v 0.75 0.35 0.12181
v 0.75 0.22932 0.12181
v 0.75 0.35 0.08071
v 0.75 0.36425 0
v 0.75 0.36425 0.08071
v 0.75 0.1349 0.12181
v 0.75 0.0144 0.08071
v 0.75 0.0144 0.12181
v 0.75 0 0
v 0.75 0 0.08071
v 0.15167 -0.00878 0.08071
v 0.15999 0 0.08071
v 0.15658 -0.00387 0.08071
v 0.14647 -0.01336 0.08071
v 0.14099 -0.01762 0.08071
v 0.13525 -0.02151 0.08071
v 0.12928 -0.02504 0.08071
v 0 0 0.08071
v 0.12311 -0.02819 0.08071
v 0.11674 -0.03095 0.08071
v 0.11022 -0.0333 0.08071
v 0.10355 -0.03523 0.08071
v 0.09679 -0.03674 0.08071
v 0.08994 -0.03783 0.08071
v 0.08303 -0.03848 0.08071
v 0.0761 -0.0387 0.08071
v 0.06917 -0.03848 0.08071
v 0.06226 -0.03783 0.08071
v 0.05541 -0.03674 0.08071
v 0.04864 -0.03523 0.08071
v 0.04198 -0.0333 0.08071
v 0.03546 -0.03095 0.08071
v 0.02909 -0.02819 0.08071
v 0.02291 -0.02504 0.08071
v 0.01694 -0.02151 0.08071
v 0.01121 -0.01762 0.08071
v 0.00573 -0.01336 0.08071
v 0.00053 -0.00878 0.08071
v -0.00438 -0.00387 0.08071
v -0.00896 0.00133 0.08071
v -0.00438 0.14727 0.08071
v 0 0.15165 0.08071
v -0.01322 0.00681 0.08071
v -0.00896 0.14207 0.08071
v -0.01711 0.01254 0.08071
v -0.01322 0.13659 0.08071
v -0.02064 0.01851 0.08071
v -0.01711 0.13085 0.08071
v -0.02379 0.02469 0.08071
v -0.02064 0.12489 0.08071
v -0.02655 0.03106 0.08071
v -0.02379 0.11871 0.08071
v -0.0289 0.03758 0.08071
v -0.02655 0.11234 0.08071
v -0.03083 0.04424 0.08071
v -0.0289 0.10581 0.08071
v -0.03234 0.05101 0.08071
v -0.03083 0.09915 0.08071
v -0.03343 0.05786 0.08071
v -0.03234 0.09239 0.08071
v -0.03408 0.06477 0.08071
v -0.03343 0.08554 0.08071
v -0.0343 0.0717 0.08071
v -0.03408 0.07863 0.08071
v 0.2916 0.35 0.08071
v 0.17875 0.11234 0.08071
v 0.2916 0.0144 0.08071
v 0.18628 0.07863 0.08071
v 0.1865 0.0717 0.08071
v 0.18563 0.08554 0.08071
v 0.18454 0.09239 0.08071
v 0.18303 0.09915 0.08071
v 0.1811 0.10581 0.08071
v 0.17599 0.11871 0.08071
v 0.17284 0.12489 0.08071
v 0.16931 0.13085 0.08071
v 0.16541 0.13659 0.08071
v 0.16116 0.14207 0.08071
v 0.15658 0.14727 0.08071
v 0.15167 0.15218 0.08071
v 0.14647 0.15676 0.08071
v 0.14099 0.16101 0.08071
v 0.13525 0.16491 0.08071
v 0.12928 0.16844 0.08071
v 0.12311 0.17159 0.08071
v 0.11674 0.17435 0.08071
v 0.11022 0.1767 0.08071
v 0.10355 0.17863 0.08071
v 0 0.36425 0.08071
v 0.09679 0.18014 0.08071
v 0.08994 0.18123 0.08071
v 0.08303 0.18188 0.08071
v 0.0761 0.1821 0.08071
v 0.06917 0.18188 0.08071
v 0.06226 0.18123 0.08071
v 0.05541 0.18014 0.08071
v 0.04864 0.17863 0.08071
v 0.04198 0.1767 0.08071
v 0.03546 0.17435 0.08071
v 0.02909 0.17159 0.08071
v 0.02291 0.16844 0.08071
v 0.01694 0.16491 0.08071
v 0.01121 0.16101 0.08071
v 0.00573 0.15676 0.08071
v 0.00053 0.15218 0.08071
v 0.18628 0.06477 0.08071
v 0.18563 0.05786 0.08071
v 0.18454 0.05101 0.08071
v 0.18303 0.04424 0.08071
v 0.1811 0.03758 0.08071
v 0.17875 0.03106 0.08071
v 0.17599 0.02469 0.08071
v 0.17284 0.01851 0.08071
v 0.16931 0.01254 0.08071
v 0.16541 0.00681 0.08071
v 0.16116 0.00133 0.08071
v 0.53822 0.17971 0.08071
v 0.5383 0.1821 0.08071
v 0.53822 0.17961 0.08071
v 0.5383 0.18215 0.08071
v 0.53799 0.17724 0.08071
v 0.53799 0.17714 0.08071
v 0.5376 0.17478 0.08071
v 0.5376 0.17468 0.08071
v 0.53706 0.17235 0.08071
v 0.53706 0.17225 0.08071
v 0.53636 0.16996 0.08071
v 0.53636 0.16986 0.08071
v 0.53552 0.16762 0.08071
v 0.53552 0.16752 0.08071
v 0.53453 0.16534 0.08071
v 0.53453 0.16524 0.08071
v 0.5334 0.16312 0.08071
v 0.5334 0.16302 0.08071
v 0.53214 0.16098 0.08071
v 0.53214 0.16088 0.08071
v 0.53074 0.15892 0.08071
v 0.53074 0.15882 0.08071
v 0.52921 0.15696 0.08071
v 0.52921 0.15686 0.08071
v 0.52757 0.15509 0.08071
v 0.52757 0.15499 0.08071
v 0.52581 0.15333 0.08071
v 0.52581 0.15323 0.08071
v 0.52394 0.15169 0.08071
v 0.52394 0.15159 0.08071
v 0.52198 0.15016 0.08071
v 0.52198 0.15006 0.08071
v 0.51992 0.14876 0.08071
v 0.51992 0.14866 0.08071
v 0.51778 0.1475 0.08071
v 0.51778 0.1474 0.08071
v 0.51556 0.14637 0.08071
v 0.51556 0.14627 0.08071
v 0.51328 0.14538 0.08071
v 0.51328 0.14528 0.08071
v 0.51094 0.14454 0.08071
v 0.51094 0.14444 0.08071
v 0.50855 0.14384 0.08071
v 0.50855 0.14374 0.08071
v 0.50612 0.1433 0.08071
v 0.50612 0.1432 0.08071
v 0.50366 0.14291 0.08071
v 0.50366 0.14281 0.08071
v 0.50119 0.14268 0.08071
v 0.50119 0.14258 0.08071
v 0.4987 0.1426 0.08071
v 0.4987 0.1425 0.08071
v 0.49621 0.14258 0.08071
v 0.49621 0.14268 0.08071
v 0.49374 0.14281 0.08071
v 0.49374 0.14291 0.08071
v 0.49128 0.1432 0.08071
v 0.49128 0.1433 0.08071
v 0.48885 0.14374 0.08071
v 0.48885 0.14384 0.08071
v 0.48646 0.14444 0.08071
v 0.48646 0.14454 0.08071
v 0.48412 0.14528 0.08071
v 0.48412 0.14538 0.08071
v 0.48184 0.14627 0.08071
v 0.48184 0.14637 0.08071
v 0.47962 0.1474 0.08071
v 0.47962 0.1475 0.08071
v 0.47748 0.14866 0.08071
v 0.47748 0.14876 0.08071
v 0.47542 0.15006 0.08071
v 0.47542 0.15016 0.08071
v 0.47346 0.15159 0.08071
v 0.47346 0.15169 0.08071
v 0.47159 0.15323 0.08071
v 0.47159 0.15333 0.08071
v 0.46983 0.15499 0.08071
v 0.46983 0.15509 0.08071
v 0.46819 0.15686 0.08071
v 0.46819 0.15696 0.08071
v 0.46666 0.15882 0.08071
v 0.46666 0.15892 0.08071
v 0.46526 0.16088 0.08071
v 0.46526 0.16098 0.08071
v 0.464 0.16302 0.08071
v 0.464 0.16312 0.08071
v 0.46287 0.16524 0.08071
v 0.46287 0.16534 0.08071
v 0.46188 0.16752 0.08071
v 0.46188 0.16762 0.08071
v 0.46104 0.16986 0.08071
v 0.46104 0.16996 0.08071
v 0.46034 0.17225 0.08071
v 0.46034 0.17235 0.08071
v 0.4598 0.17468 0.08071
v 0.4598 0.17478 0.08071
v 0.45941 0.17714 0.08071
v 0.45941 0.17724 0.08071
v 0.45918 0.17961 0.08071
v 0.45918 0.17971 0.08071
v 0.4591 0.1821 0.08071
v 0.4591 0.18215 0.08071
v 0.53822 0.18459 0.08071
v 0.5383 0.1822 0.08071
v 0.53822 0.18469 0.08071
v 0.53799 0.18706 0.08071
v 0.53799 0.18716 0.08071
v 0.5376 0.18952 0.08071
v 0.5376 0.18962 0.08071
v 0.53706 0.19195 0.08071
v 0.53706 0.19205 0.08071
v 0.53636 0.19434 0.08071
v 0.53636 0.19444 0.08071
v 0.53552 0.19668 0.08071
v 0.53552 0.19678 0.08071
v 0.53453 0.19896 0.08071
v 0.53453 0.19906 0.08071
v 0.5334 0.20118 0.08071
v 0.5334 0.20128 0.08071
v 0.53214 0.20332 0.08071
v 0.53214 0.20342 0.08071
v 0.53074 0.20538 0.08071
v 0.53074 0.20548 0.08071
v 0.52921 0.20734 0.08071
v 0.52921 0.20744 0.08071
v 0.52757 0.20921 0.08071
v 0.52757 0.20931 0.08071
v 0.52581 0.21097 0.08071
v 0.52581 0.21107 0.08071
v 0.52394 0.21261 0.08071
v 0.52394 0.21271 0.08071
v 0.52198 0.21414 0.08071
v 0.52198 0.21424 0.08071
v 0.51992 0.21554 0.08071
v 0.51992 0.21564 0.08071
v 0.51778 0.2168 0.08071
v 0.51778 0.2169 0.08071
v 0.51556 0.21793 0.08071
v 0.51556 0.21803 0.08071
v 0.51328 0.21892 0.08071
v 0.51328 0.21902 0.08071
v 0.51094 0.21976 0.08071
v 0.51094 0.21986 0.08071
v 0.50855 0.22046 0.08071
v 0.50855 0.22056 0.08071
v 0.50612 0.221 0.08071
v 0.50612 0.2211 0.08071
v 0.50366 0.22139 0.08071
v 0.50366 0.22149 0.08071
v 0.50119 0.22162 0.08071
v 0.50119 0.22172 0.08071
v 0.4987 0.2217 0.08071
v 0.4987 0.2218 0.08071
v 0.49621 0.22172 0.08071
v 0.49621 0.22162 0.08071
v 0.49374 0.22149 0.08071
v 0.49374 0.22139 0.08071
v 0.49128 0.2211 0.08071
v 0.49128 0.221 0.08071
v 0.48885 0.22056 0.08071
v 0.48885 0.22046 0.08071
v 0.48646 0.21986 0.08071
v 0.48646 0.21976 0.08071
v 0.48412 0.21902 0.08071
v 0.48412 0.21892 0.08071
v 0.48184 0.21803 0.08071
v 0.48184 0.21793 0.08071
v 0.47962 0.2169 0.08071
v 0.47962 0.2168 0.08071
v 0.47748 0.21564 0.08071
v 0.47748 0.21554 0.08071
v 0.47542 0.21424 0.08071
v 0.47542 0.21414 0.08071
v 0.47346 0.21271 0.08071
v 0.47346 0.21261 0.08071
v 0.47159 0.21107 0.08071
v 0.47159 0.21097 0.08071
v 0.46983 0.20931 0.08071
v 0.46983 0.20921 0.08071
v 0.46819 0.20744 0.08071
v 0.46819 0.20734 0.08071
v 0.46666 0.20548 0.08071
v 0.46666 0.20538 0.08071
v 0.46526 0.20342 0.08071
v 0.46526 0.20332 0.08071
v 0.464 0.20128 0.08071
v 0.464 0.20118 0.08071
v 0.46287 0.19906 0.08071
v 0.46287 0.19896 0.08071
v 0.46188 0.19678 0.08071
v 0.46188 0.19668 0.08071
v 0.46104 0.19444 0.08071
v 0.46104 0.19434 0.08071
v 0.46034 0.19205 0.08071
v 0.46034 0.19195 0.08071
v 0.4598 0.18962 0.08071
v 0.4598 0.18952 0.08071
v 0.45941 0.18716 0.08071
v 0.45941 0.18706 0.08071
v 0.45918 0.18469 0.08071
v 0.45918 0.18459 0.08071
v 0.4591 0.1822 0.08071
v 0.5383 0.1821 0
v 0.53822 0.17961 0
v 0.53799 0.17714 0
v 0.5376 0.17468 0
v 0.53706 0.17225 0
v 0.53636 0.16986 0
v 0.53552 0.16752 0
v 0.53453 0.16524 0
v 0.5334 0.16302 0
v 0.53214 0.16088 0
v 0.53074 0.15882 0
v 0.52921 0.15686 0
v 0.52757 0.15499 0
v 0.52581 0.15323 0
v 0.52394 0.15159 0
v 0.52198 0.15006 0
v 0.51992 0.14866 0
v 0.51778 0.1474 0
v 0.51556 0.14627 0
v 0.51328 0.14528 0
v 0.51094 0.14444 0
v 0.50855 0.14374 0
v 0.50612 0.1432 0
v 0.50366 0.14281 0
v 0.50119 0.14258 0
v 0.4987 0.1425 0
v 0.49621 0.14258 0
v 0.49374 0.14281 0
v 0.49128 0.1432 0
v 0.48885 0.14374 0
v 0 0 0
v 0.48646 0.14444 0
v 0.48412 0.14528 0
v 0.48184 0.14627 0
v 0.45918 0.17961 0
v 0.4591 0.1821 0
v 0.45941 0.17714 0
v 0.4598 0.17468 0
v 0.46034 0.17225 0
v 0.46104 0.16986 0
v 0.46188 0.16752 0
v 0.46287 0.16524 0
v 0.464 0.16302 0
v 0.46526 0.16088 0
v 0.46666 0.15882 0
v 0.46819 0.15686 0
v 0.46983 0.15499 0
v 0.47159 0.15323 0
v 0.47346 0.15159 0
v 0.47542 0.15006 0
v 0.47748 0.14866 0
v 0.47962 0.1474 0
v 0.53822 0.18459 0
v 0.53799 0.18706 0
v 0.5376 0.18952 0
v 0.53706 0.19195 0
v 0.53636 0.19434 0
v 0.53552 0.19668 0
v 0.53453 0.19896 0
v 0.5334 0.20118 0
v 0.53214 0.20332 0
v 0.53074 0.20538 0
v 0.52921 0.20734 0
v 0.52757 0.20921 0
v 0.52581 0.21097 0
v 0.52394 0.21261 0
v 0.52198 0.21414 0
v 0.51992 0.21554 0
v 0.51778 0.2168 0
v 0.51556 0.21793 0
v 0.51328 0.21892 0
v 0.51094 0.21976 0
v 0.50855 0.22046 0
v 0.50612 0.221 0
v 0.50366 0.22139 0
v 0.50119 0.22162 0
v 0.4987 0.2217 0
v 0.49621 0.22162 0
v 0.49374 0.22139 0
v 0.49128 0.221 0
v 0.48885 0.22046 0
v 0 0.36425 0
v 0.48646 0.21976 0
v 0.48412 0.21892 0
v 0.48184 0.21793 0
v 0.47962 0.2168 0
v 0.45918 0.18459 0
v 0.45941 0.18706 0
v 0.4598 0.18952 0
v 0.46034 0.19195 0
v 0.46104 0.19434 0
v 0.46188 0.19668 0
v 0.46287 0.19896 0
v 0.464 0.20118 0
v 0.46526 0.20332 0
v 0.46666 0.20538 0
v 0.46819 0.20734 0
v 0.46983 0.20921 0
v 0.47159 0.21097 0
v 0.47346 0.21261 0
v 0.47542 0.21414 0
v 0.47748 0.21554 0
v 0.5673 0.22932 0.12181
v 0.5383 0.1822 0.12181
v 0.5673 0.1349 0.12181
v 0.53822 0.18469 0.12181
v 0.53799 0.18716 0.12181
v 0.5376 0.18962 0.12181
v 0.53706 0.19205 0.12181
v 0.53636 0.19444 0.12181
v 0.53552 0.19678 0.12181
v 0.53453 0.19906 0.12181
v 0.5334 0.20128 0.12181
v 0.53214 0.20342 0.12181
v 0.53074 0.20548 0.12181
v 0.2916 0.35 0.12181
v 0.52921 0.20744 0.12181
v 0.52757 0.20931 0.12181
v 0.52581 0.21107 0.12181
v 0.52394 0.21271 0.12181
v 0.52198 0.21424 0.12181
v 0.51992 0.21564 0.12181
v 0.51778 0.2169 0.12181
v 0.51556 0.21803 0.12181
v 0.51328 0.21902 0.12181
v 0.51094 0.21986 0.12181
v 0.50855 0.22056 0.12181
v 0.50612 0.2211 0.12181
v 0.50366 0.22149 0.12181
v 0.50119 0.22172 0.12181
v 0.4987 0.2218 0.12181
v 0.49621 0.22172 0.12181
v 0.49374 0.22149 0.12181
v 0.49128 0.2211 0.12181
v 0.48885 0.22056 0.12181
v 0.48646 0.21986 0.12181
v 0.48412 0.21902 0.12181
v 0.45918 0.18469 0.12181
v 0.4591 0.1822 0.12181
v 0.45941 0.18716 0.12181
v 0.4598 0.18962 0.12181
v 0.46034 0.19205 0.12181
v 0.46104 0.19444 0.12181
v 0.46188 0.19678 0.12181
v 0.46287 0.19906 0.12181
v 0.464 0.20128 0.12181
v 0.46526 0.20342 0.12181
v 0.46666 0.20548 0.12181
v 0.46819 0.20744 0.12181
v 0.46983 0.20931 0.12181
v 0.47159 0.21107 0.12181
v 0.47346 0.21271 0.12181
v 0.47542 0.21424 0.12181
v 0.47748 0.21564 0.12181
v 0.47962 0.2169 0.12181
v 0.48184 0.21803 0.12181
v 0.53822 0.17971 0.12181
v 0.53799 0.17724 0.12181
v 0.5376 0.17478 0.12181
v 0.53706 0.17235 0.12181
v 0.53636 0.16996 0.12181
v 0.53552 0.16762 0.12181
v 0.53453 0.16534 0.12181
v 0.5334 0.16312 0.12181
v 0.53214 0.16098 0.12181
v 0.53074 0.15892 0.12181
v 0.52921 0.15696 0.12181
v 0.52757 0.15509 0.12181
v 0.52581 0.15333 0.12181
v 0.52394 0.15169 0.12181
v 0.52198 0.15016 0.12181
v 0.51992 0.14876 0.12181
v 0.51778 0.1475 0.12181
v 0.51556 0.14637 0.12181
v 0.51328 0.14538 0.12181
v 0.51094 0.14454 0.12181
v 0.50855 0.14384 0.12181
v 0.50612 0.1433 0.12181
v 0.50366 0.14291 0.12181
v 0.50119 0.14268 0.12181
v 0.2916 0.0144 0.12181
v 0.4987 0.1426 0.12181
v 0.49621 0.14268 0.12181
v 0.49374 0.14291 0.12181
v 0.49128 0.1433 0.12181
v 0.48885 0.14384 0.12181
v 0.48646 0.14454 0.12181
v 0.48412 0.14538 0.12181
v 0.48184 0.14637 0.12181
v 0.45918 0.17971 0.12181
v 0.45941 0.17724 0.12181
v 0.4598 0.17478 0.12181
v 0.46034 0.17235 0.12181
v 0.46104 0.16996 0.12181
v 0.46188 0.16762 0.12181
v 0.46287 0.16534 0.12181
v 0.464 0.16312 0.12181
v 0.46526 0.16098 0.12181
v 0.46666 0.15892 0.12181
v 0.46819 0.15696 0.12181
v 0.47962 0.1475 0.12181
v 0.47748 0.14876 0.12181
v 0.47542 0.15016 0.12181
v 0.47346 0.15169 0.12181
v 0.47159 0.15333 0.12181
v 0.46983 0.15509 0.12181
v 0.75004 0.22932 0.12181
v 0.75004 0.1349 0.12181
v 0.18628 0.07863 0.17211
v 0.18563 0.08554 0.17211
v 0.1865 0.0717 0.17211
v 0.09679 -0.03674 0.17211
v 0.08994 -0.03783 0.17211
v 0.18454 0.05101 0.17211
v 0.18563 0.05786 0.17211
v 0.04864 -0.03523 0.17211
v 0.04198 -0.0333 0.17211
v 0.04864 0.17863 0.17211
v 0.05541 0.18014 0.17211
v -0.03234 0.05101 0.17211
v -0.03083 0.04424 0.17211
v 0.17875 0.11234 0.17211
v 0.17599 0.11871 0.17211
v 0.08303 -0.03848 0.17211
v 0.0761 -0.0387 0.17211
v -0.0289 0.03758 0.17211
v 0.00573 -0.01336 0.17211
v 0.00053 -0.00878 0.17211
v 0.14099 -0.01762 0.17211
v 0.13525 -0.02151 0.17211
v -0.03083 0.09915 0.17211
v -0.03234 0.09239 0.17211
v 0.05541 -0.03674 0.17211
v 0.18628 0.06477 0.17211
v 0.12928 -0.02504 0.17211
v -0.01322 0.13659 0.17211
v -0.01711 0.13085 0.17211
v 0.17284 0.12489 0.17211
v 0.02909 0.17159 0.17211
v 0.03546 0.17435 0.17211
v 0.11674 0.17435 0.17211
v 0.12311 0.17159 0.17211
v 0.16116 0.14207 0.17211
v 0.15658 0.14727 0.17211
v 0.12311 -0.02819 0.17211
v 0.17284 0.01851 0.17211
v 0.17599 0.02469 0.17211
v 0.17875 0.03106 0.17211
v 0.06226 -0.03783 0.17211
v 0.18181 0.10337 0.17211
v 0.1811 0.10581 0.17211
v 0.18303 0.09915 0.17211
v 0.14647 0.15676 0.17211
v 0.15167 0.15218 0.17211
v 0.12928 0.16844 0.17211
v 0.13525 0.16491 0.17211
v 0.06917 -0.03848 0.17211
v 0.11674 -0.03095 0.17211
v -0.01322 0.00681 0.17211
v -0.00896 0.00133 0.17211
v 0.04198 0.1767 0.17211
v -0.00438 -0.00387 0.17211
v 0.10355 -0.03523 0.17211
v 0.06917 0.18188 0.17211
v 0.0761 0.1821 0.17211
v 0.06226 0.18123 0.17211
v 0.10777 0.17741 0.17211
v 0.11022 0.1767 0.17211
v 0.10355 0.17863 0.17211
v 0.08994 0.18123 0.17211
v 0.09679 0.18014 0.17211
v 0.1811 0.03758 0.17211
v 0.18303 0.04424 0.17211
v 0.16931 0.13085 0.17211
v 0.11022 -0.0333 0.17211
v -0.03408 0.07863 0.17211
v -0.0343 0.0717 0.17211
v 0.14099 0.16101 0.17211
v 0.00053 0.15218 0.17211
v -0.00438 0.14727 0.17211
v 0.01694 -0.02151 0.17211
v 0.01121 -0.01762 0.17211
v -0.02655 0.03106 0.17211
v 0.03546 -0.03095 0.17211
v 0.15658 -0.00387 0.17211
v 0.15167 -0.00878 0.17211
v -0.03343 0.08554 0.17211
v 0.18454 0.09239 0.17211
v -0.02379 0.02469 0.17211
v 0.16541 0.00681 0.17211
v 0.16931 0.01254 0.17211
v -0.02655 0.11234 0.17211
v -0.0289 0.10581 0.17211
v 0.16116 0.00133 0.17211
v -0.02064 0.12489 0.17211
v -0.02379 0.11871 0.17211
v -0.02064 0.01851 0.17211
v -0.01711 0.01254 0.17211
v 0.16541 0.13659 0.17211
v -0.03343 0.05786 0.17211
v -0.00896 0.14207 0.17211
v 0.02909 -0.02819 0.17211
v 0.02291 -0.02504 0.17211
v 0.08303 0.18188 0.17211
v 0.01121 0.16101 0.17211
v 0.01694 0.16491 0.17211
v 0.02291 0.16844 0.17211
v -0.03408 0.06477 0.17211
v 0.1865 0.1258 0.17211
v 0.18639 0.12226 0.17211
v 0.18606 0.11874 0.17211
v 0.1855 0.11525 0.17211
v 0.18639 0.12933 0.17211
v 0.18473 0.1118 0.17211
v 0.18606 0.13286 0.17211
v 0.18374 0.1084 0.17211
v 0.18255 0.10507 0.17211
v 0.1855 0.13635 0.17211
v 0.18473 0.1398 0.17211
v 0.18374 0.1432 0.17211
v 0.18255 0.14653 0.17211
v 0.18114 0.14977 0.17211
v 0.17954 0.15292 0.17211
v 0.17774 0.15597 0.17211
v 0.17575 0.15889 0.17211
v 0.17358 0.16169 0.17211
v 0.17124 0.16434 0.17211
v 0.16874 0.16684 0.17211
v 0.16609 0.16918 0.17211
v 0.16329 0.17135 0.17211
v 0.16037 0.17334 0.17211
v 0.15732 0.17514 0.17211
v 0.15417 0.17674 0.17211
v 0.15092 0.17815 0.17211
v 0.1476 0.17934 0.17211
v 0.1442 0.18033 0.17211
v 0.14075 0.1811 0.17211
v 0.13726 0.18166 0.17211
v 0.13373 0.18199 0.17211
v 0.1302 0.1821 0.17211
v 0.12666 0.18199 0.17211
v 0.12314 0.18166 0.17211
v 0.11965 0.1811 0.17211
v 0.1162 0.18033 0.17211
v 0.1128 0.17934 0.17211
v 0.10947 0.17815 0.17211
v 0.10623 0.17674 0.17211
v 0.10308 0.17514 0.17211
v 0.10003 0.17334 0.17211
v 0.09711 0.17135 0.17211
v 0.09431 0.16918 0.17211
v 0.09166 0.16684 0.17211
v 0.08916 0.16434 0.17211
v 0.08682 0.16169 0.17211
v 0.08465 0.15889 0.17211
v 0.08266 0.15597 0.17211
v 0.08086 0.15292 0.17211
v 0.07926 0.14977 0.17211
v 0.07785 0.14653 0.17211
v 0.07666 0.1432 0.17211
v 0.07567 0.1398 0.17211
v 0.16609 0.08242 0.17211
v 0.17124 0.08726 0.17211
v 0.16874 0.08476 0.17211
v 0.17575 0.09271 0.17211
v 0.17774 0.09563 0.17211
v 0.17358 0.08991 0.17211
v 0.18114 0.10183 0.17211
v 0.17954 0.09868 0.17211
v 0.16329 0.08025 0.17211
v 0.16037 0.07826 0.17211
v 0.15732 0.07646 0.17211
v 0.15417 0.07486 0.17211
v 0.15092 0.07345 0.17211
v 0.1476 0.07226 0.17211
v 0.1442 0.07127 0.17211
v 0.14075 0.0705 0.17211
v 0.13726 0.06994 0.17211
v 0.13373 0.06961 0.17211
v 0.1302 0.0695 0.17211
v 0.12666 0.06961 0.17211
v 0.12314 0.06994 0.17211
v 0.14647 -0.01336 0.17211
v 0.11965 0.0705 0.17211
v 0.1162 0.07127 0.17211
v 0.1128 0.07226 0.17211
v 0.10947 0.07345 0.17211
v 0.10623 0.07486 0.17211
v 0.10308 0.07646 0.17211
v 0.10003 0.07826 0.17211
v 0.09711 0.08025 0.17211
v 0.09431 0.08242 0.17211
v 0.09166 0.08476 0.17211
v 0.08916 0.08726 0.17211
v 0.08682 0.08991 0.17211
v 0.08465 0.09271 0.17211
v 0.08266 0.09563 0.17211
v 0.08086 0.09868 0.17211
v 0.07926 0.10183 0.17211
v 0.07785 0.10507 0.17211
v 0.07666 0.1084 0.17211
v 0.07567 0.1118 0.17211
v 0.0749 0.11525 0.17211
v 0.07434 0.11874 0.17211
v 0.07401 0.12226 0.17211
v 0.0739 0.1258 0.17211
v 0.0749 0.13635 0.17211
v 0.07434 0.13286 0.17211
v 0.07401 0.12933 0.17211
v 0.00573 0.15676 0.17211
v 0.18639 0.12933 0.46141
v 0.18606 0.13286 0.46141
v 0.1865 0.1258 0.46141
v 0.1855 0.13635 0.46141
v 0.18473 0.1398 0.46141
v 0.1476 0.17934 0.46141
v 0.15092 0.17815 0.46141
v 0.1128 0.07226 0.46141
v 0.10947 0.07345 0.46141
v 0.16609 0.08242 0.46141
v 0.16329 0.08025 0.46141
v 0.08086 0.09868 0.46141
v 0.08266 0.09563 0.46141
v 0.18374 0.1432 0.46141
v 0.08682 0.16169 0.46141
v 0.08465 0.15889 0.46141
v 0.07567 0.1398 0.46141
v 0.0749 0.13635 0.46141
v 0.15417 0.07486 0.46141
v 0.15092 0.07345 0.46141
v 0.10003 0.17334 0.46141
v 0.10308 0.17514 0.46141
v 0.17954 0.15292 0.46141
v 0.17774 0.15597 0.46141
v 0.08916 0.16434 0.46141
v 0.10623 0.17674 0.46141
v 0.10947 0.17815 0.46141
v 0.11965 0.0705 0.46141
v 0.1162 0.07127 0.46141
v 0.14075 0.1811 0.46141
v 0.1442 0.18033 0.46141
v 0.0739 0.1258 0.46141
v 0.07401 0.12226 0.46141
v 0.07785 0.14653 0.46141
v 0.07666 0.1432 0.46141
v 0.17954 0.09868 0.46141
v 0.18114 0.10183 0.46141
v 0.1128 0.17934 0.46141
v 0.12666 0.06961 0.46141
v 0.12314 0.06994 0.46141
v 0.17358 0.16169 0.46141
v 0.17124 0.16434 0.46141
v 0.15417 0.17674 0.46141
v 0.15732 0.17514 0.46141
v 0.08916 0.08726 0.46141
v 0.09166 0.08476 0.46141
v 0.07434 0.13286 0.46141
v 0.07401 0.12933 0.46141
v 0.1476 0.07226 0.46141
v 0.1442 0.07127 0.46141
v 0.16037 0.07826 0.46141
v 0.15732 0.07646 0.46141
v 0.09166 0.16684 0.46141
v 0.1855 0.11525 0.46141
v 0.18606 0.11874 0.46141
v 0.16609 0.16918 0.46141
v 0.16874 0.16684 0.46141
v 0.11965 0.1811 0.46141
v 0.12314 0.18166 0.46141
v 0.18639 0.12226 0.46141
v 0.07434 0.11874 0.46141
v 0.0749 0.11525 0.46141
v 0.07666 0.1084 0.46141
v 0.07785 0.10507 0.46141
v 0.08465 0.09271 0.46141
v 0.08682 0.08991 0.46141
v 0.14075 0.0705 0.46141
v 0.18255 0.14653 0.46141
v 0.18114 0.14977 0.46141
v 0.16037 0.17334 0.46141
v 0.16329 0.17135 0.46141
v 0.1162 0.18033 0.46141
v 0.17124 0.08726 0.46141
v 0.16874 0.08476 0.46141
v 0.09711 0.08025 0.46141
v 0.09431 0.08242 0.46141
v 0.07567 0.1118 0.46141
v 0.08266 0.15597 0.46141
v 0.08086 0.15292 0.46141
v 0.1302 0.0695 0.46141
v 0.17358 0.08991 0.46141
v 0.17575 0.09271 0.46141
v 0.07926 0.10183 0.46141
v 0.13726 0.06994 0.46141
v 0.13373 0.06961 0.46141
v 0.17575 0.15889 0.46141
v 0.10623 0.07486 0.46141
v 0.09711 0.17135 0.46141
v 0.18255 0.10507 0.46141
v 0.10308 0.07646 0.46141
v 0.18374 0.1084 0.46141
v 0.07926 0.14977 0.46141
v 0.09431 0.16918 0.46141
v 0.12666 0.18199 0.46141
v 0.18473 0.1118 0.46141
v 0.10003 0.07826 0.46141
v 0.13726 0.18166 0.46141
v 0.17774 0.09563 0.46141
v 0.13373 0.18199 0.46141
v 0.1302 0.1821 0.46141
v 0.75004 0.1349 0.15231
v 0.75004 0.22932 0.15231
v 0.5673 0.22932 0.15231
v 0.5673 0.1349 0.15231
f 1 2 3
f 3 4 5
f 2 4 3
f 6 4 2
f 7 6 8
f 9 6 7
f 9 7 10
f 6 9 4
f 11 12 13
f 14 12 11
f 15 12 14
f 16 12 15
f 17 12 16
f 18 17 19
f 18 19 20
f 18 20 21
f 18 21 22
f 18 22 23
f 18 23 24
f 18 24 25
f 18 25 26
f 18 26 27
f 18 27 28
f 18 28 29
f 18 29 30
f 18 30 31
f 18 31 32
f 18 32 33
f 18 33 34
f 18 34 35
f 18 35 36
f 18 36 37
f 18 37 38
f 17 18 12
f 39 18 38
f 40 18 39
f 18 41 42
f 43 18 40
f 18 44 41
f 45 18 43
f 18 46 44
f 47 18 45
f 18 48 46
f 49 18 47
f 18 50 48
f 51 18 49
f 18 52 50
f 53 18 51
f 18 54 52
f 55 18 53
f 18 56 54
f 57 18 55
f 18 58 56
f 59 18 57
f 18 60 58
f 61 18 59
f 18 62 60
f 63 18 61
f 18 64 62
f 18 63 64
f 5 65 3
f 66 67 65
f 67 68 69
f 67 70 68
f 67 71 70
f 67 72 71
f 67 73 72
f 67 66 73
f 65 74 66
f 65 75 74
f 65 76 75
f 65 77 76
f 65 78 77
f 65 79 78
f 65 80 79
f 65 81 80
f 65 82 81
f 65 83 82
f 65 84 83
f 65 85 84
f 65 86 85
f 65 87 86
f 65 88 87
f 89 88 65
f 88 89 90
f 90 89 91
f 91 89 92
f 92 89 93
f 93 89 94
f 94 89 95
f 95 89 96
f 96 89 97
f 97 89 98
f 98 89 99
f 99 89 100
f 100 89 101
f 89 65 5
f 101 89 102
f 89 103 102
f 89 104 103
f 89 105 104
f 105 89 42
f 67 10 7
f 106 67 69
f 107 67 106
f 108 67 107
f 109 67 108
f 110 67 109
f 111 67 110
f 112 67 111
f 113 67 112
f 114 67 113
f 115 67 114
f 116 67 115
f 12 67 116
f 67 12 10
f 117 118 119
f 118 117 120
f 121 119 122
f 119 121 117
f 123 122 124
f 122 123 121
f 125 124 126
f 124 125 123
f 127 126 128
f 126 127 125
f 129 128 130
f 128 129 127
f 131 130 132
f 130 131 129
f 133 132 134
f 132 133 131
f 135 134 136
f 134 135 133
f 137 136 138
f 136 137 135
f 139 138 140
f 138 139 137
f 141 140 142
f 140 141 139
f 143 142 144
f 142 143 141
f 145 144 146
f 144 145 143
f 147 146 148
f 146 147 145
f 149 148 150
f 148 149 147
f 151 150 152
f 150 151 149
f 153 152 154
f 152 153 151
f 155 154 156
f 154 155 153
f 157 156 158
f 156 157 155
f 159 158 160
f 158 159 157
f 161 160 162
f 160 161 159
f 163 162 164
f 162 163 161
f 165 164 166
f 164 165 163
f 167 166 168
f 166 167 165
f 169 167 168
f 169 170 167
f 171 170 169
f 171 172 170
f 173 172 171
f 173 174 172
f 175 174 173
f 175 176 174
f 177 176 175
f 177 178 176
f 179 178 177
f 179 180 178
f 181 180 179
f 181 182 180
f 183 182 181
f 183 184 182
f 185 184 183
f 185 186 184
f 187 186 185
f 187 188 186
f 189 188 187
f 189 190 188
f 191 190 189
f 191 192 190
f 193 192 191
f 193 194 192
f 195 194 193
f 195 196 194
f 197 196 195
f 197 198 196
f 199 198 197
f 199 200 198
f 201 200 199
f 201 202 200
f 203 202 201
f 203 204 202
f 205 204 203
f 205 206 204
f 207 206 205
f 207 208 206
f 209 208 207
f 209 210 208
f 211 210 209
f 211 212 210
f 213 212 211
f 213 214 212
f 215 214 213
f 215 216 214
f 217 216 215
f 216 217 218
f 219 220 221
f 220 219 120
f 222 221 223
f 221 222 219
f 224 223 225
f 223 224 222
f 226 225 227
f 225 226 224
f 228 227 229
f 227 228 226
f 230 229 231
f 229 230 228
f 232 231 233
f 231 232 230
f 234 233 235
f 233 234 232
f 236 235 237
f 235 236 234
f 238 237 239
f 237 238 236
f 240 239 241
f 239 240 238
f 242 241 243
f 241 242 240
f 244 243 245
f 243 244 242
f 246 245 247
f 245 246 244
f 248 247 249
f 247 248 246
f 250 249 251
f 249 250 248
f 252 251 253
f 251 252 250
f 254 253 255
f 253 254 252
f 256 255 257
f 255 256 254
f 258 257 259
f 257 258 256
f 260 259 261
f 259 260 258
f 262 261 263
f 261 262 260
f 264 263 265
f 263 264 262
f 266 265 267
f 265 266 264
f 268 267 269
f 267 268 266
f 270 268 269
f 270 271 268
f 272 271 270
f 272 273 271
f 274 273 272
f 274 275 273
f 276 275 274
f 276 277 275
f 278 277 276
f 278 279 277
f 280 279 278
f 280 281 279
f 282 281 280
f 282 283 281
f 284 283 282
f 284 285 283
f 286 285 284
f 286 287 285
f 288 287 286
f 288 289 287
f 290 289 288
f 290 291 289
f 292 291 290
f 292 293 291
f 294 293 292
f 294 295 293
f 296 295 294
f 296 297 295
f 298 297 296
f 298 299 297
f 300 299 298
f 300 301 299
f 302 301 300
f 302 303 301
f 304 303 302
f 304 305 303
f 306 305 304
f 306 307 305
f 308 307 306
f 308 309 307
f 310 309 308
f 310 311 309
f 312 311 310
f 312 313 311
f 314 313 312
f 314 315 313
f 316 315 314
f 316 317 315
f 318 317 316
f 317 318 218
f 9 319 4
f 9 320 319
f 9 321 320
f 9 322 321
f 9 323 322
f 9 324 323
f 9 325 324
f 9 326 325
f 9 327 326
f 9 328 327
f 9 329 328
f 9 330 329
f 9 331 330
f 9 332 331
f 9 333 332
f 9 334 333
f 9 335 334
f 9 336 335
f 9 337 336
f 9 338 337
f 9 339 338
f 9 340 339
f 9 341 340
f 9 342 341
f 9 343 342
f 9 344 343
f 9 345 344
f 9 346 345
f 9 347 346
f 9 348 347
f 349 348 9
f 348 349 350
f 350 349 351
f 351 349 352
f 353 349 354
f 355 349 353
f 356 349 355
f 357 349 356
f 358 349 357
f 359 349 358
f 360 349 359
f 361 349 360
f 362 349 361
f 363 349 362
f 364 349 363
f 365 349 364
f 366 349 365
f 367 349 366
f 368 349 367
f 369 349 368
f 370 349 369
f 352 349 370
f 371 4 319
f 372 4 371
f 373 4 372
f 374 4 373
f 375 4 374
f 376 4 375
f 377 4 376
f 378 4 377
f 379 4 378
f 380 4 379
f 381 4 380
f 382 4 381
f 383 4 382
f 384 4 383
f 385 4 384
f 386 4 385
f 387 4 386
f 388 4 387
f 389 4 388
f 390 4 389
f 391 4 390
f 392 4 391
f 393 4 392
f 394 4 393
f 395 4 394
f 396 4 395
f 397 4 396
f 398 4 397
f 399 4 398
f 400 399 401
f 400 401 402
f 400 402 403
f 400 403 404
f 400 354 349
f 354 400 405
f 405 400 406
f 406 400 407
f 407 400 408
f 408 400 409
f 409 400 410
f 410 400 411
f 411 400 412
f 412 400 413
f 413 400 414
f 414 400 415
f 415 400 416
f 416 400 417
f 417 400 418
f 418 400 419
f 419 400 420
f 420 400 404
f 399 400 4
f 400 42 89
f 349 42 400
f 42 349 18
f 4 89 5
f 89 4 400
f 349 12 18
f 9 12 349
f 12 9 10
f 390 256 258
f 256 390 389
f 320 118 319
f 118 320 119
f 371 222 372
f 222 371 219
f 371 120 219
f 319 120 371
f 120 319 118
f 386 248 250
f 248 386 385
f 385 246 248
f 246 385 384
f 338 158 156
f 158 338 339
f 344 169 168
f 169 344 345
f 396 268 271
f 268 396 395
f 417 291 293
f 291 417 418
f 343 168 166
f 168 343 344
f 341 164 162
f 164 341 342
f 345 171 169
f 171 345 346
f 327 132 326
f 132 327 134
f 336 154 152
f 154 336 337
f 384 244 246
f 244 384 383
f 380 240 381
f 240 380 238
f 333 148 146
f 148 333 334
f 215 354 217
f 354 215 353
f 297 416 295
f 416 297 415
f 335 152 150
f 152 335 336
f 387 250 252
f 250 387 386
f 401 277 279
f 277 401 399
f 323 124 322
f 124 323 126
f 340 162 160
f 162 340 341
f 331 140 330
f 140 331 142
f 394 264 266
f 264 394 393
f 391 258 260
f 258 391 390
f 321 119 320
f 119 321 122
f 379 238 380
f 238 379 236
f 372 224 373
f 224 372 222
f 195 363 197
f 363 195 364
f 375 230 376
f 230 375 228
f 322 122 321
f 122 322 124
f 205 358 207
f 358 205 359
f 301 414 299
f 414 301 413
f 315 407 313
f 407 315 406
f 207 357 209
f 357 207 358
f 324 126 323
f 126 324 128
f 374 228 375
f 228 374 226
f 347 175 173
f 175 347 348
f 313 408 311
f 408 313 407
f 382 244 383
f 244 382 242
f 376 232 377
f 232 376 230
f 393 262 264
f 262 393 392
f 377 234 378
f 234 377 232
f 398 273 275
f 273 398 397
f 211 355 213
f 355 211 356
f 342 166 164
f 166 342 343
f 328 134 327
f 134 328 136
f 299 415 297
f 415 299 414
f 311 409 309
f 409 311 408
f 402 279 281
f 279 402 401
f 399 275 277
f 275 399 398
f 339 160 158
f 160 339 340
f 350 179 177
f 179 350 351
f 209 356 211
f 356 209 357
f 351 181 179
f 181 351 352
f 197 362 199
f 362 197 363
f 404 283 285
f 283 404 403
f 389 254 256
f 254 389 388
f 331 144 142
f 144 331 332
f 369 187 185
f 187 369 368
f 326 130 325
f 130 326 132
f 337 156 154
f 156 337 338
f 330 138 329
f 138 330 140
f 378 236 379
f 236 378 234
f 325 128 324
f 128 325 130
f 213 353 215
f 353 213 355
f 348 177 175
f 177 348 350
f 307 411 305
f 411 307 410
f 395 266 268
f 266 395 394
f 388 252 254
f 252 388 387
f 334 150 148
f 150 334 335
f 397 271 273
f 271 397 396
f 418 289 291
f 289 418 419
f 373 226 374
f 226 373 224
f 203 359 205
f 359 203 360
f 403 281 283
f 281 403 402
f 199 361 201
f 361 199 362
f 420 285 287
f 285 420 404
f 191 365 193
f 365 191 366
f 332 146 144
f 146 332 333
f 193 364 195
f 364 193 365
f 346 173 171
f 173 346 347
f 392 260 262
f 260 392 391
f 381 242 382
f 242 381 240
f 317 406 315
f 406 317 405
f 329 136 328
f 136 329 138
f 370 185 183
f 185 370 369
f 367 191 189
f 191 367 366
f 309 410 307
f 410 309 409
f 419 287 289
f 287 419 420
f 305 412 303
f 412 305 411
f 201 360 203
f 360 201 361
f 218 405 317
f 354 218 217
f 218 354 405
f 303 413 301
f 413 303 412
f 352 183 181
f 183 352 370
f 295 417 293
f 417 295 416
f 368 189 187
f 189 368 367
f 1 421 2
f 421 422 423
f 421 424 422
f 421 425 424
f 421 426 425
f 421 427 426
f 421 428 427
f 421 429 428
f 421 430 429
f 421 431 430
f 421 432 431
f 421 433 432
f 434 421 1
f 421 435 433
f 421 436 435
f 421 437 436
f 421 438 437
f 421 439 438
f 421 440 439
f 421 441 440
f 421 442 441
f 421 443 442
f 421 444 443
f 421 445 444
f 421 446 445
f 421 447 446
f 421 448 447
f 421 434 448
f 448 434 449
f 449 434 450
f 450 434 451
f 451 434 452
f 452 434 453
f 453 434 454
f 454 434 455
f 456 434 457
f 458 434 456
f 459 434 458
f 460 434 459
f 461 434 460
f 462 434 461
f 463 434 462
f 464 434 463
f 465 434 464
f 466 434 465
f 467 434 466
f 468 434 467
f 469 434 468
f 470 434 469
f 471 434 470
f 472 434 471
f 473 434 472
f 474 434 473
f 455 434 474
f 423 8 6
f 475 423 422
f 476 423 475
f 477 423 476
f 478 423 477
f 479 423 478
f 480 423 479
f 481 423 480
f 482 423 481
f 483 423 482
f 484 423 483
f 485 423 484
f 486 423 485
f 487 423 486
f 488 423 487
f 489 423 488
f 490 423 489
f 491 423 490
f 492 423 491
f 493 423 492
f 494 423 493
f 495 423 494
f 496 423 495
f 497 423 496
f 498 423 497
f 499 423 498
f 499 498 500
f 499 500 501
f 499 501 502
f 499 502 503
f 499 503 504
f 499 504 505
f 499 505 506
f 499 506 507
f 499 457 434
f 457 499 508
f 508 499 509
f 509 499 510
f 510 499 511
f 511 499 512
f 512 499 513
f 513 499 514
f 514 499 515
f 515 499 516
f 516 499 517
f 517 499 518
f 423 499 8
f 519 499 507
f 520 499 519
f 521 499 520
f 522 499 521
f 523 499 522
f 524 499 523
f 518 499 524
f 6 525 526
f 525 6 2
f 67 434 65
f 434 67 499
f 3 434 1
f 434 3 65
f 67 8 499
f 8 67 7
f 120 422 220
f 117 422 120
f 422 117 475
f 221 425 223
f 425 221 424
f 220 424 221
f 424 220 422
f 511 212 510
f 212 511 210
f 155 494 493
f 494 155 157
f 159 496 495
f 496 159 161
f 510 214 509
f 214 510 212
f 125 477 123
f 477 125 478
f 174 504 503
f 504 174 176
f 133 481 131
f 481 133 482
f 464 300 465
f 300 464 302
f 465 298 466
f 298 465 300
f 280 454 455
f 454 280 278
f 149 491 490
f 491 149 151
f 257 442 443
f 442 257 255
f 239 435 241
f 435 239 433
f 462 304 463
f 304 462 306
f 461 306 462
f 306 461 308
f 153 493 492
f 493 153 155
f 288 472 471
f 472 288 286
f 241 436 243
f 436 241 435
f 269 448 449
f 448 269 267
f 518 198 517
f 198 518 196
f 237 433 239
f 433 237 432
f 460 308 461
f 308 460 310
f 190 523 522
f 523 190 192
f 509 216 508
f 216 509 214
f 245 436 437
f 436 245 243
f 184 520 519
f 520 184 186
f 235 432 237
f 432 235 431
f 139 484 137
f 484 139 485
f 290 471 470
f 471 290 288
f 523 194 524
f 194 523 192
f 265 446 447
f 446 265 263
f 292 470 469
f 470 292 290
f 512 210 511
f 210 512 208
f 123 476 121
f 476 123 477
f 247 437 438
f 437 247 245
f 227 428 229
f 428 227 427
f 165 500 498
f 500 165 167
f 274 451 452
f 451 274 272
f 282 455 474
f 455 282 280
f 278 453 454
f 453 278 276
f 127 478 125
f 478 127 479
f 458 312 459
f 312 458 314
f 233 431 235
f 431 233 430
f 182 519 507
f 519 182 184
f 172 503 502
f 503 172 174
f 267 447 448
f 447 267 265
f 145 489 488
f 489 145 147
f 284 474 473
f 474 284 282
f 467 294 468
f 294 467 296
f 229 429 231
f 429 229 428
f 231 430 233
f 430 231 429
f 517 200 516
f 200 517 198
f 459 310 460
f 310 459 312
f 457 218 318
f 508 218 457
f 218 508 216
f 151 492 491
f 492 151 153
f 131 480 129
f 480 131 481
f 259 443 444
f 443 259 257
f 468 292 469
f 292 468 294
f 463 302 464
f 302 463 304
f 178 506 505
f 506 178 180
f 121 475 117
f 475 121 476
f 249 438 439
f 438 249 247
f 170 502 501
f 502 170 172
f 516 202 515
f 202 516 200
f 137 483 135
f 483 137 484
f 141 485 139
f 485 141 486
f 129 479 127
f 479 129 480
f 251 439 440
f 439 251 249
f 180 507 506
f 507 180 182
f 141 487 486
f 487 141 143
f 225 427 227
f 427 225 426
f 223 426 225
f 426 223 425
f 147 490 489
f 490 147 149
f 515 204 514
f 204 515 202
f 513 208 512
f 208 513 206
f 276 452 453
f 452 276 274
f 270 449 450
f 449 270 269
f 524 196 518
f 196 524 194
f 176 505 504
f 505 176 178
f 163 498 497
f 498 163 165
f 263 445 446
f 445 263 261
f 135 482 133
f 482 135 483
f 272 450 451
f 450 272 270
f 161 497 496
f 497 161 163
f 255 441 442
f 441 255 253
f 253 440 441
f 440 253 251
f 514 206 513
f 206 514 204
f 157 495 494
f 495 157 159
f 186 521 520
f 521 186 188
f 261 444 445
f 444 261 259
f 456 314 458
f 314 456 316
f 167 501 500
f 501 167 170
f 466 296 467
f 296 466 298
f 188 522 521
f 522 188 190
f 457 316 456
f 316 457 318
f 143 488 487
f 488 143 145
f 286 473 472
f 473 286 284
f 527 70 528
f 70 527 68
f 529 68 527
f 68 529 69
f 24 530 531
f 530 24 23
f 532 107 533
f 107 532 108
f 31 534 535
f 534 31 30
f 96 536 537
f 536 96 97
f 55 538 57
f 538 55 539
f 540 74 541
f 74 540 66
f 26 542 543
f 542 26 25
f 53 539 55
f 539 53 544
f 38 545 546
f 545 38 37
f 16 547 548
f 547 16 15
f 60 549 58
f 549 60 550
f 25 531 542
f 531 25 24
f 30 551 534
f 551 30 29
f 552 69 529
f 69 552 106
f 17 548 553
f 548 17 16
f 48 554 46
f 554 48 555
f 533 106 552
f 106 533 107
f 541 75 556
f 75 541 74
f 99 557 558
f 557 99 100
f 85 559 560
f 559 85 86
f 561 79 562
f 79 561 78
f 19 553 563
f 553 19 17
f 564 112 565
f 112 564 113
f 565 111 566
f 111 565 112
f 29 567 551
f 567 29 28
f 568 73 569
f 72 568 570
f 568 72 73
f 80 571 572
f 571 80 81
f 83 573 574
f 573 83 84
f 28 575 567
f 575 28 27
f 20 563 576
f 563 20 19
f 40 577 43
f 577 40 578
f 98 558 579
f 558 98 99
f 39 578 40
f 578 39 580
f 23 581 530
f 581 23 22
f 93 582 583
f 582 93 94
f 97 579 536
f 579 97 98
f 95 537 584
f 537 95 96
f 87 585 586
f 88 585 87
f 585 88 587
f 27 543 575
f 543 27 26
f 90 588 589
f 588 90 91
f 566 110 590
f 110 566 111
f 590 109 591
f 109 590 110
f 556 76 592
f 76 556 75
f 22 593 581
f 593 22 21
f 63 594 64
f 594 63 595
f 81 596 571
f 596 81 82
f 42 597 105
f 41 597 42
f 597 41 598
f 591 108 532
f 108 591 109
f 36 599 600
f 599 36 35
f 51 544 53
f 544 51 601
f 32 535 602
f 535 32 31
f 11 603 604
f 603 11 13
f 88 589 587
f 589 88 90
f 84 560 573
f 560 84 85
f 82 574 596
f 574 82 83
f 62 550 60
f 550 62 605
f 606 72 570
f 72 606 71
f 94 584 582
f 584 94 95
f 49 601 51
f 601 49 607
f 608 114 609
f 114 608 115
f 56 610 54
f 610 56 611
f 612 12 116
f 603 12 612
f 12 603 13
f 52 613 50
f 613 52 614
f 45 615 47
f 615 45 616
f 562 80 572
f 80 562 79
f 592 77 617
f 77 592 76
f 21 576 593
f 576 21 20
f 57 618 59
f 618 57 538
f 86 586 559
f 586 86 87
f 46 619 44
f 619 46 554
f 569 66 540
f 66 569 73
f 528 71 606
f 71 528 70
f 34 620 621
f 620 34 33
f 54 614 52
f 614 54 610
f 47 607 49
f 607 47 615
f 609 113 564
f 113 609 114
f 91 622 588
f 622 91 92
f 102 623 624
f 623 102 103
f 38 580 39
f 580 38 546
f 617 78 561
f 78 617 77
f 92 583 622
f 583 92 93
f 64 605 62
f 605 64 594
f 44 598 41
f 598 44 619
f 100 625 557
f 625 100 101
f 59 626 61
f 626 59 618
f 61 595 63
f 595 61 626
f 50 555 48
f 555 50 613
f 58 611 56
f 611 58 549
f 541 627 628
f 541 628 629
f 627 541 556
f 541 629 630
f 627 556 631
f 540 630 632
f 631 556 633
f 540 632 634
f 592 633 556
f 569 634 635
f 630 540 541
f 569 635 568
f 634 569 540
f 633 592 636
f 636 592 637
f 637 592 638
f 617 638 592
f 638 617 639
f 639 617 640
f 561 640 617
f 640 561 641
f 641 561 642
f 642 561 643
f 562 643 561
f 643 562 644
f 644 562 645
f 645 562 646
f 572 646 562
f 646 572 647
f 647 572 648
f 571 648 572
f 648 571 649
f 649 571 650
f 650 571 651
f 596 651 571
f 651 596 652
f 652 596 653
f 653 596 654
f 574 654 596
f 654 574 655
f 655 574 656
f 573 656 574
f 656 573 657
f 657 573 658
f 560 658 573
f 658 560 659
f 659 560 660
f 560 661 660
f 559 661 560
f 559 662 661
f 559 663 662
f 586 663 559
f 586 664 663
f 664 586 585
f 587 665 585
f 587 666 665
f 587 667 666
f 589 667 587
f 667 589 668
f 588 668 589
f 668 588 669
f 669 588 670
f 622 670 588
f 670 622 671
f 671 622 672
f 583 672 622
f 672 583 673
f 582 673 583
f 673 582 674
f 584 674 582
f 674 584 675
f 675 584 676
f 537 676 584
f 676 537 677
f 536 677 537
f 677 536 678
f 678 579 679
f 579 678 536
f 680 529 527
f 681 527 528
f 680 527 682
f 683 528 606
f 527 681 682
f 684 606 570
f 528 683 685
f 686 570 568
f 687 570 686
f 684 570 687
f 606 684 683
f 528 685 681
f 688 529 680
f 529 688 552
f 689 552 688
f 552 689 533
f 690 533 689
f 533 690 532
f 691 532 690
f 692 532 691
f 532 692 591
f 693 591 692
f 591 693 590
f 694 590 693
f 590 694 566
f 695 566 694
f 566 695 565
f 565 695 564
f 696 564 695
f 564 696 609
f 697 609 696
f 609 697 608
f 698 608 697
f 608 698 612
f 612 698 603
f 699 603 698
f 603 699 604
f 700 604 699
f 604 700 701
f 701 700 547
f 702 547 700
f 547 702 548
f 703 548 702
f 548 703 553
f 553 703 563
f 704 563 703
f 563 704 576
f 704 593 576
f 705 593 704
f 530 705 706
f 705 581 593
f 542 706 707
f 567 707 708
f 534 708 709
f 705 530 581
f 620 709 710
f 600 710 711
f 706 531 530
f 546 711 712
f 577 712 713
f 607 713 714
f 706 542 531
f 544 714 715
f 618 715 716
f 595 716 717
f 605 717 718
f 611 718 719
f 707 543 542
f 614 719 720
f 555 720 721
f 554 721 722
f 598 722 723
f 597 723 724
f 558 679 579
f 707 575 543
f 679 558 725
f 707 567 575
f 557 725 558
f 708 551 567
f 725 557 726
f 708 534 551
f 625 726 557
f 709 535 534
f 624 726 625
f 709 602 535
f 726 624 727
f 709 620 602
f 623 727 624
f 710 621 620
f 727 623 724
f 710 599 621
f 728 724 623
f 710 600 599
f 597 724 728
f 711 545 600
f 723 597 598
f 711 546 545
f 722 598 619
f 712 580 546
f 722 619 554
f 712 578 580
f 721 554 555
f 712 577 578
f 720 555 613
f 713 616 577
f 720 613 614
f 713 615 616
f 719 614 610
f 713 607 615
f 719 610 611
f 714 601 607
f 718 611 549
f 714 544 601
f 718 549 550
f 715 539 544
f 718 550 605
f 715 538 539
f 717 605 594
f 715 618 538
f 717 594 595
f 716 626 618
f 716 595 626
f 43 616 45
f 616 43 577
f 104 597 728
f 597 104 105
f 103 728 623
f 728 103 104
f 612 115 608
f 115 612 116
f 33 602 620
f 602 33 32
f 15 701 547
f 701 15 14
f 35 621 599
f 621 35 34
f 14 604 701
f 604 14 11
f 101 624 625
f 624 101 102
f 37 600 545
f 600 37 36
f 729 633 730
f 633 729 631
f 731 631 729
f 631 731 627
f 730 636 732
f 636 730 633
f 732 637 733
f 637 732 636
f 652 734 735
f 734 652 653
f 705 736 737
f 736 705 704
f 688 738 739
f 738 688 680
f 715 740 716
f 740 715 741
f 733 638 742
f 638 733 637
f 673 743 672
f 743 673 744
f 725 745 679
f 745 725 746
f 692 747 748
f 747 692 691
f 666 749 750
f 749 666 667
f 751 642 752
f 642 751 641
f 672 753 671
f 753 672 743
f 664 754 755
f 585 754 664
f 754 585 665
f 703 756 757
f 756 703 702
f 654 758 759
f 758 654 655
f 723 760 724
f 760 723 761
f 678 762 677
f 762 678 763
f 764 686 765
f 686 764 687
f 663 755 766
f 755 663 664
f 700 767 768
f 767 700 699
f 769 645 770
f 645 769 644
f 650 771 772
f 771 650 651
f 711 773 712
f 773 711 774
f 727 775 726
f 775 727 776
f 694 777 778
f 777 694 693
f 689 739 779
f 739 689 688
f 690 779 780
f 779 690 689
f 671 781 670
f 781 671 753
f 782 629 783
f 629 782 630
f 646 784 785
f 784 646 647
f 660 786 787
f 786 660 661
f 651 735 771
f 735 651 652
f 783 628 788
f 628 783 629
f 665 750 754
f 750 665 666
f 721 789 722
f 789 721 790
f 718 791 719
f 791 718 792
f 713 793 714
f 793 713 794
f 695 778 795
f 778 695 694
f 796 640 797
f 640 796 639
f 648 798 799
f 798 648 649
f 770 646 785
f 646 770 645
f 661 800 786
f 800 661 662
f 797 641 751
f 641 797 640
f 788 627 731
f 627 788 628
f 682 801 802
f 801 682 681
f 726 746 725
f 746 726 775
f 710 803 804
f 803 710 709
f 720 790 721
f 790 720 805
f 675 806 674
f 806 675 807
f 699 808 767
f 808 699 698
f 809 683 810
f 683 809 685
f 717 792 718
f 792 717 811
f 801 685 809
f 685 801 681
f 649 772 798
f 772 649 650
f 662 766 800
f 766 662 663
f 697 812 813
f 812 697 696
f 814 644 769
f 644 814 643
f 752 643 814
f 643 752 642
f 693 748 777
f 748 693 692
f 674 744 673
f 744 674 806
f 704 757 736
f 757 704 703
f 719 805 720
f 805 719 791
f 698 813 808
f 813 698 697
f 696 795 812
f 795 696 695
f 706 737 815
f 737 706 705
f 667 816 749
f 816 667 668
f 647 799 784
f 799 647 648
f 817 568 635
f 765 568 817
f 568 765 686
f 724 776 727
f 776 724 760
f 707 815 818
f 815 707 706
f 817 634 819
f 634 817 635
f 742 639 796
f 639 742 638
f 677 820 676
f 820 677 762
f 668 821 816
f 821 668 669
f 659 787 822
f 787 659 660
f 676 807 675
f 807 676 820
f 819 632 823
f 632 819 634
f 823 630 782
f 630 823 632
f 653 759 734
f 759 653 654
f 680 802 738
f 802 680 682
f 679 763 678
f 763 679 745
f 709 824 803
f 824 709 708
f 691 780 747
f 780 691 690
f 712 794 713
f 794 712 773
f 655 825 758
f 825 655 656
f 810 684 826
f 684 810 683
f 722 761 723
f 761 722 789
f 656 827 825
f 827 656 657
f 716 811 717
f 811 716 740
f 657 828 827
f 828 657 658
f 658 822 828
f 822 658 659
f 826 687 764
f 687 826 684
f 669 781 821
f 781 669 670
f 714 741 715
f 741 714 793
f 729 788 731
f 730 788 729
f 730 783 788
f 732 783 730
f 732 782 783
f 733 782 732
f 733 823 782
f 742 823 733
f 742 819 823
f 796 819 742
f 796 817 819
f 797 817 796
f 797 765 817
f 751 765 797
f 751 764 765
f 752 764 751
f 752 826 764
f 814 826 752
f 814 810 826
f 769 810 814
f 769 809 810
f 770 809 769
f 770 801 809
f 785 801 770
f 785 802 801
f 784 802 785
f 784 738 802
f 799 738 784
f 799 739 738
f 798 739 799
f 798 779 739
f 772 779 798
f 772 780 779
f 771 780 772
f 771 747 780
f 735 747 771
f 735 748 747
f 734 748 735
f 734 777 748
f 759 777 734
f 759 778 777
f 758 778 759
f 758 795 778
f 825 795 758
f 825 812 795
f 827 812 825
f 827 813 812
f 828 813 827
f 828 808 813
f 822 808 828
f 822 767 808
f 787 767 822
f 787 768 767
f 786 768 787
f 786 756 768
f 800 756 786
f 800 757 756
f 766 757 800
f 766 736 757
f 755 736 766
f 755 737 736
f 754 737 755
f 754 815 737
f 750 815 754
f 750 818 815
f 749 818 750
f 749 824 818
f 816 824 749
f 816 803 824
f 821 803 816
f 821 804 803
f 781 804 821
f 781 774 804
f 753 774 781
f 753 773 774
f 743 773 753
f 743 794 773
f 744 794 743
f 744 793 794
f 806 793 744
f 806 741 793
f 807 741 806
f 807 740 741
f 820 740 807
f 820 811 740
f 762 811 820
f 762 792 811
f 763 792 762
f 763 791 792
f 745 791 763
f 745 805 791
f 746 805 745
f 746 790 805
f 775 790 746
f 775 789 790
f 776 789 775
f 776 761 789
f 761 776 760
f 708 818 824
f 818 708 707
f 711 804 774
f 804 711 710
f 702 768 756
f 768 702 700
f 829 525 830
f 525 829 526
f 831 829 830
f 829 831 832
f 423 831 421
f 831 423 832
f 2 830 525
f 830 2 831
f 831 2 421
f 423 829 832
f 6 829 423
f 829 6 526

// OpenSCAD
// Parametric CAD Model - Base with Stepped Stack and Raised Region
// All dimensions in millimeters

// ==================== PARAMETERS ====================
// Main base dimensions
base_length = 0.75;
base_width = 0.364251;
base_height = 0.080711;
extrusion_depth = 0.0807;

// Circular through opening in base
hole_radius = 0.0396;
hole_x = 0.4987;
hole_y = 0.1821;

// Lower collar parameters
collar_radius = 0.1104;
collar_center_x = 0.1865;
collar_center_y = 0.1821;
collar_footprint = 0.220812;
collar_offset_left = 0.0761;
collar_offset_right = 0.4531;
collar_offset_front = 0.0717;
collar_offset_back = 0.0718;
collar_height = 0.0914;

// Upper post parameters
post_radius = 0.0563;
post_footprint = 0.1126;
post_offset_left = 0.1302;
post_offset_right = 0.5072;
post_offset_front = 0.1258;
post_offset_back = 0.1259;
post_height = 0.2893;

// Raised rounded region parameters
raised_length = 0.4584;
raised_width = 0.3356;
raised_offset_left = 0.2916;
raised_offset_right = 0;
raised_offset_front = 0.0144;
raised_offset_back = 0.0143;
raised_height = 0.0411;

// Circular profile in raised region
raised_hole_radius = 0.0396;
raised_hole_x = 0.4987;
raised_hole_y = 0.1822;

// Rectangular rib parameters
rib_length = 0.182741;
rib_width = 0.094416;
rib_offset_left = 0.5673;
rib_offset_right = 0;
rib_offset_front = 0.1349;
rib_offset_back = 0.135;
rib_height = 0.0305;

// Resolution for curved surfaces
$fn = 100;

// ==================== MODULES ====================

// Main base with through hole
module main_base() {
    difference() {
        // Base solid block
        cube([base_length, base_width, base_height]);
        
        // Circular through opening
        translate([hole_x, hole_y, -0.001])
            cylinder(h = base_height + 0.002, r = hole_radius);
    }
}

// Lower circular collar
module lower_collar() {
    // Calculate collar position from offsets
    collar_x = collar_offset_left;
    collar_y = collar_offset_front;
    
    translate([collar_x, collar_y, base_height])
        cylinder(h = collar_height, r = collar_radius);
}

// Upper solid post
module upper_post() {
    // Calculate post position from offsets
    post_x = post_offset_left;
    post_y = post_offset_front;
    
    translate([post_x, post_y, base_height + collar_height])
        cylinder(h = post_height, r = post_radius);
}

// Raised rounded region on right side
module raised_region() {
    // Calculate raised region position
    raised_x = raised_offset_left;
    raised_y = raised_offset_front;
    
    difference() {
        // Solid raised block
        translate([raised_x, raised_y, base_height])
            cube([raised_length, raised_width, raised_height]);
        
        // Circular profile in raised region
        translate([raised_hole_x, raised_hole_y, base_height - 0.001])
            cylinder(h = raised_height + 0.002, r = raised_hole_radius);
    }
}

// Rectangular rib/tab on raised region
module rectangular_rib() {
    // Calculate rib position
    rib_x = rib_offset_left;
    rib_y = rib_offset_front;
    
    translate([rib_x, rib_y, base_height + raised_height])
        cube([rib_length, rib_width, rib_height]);
}

// ==================== MAIN ASSEMBLY ====================

union() {
    // Base structure
    main_base();
    
    // Stepped stack (collar + post)
    lower_collar();
    upper_post();
    
    // Raised region with circular profile
    raised_region();
    
    // Rectangular rib on raised region
    rectangular_rib();
}
